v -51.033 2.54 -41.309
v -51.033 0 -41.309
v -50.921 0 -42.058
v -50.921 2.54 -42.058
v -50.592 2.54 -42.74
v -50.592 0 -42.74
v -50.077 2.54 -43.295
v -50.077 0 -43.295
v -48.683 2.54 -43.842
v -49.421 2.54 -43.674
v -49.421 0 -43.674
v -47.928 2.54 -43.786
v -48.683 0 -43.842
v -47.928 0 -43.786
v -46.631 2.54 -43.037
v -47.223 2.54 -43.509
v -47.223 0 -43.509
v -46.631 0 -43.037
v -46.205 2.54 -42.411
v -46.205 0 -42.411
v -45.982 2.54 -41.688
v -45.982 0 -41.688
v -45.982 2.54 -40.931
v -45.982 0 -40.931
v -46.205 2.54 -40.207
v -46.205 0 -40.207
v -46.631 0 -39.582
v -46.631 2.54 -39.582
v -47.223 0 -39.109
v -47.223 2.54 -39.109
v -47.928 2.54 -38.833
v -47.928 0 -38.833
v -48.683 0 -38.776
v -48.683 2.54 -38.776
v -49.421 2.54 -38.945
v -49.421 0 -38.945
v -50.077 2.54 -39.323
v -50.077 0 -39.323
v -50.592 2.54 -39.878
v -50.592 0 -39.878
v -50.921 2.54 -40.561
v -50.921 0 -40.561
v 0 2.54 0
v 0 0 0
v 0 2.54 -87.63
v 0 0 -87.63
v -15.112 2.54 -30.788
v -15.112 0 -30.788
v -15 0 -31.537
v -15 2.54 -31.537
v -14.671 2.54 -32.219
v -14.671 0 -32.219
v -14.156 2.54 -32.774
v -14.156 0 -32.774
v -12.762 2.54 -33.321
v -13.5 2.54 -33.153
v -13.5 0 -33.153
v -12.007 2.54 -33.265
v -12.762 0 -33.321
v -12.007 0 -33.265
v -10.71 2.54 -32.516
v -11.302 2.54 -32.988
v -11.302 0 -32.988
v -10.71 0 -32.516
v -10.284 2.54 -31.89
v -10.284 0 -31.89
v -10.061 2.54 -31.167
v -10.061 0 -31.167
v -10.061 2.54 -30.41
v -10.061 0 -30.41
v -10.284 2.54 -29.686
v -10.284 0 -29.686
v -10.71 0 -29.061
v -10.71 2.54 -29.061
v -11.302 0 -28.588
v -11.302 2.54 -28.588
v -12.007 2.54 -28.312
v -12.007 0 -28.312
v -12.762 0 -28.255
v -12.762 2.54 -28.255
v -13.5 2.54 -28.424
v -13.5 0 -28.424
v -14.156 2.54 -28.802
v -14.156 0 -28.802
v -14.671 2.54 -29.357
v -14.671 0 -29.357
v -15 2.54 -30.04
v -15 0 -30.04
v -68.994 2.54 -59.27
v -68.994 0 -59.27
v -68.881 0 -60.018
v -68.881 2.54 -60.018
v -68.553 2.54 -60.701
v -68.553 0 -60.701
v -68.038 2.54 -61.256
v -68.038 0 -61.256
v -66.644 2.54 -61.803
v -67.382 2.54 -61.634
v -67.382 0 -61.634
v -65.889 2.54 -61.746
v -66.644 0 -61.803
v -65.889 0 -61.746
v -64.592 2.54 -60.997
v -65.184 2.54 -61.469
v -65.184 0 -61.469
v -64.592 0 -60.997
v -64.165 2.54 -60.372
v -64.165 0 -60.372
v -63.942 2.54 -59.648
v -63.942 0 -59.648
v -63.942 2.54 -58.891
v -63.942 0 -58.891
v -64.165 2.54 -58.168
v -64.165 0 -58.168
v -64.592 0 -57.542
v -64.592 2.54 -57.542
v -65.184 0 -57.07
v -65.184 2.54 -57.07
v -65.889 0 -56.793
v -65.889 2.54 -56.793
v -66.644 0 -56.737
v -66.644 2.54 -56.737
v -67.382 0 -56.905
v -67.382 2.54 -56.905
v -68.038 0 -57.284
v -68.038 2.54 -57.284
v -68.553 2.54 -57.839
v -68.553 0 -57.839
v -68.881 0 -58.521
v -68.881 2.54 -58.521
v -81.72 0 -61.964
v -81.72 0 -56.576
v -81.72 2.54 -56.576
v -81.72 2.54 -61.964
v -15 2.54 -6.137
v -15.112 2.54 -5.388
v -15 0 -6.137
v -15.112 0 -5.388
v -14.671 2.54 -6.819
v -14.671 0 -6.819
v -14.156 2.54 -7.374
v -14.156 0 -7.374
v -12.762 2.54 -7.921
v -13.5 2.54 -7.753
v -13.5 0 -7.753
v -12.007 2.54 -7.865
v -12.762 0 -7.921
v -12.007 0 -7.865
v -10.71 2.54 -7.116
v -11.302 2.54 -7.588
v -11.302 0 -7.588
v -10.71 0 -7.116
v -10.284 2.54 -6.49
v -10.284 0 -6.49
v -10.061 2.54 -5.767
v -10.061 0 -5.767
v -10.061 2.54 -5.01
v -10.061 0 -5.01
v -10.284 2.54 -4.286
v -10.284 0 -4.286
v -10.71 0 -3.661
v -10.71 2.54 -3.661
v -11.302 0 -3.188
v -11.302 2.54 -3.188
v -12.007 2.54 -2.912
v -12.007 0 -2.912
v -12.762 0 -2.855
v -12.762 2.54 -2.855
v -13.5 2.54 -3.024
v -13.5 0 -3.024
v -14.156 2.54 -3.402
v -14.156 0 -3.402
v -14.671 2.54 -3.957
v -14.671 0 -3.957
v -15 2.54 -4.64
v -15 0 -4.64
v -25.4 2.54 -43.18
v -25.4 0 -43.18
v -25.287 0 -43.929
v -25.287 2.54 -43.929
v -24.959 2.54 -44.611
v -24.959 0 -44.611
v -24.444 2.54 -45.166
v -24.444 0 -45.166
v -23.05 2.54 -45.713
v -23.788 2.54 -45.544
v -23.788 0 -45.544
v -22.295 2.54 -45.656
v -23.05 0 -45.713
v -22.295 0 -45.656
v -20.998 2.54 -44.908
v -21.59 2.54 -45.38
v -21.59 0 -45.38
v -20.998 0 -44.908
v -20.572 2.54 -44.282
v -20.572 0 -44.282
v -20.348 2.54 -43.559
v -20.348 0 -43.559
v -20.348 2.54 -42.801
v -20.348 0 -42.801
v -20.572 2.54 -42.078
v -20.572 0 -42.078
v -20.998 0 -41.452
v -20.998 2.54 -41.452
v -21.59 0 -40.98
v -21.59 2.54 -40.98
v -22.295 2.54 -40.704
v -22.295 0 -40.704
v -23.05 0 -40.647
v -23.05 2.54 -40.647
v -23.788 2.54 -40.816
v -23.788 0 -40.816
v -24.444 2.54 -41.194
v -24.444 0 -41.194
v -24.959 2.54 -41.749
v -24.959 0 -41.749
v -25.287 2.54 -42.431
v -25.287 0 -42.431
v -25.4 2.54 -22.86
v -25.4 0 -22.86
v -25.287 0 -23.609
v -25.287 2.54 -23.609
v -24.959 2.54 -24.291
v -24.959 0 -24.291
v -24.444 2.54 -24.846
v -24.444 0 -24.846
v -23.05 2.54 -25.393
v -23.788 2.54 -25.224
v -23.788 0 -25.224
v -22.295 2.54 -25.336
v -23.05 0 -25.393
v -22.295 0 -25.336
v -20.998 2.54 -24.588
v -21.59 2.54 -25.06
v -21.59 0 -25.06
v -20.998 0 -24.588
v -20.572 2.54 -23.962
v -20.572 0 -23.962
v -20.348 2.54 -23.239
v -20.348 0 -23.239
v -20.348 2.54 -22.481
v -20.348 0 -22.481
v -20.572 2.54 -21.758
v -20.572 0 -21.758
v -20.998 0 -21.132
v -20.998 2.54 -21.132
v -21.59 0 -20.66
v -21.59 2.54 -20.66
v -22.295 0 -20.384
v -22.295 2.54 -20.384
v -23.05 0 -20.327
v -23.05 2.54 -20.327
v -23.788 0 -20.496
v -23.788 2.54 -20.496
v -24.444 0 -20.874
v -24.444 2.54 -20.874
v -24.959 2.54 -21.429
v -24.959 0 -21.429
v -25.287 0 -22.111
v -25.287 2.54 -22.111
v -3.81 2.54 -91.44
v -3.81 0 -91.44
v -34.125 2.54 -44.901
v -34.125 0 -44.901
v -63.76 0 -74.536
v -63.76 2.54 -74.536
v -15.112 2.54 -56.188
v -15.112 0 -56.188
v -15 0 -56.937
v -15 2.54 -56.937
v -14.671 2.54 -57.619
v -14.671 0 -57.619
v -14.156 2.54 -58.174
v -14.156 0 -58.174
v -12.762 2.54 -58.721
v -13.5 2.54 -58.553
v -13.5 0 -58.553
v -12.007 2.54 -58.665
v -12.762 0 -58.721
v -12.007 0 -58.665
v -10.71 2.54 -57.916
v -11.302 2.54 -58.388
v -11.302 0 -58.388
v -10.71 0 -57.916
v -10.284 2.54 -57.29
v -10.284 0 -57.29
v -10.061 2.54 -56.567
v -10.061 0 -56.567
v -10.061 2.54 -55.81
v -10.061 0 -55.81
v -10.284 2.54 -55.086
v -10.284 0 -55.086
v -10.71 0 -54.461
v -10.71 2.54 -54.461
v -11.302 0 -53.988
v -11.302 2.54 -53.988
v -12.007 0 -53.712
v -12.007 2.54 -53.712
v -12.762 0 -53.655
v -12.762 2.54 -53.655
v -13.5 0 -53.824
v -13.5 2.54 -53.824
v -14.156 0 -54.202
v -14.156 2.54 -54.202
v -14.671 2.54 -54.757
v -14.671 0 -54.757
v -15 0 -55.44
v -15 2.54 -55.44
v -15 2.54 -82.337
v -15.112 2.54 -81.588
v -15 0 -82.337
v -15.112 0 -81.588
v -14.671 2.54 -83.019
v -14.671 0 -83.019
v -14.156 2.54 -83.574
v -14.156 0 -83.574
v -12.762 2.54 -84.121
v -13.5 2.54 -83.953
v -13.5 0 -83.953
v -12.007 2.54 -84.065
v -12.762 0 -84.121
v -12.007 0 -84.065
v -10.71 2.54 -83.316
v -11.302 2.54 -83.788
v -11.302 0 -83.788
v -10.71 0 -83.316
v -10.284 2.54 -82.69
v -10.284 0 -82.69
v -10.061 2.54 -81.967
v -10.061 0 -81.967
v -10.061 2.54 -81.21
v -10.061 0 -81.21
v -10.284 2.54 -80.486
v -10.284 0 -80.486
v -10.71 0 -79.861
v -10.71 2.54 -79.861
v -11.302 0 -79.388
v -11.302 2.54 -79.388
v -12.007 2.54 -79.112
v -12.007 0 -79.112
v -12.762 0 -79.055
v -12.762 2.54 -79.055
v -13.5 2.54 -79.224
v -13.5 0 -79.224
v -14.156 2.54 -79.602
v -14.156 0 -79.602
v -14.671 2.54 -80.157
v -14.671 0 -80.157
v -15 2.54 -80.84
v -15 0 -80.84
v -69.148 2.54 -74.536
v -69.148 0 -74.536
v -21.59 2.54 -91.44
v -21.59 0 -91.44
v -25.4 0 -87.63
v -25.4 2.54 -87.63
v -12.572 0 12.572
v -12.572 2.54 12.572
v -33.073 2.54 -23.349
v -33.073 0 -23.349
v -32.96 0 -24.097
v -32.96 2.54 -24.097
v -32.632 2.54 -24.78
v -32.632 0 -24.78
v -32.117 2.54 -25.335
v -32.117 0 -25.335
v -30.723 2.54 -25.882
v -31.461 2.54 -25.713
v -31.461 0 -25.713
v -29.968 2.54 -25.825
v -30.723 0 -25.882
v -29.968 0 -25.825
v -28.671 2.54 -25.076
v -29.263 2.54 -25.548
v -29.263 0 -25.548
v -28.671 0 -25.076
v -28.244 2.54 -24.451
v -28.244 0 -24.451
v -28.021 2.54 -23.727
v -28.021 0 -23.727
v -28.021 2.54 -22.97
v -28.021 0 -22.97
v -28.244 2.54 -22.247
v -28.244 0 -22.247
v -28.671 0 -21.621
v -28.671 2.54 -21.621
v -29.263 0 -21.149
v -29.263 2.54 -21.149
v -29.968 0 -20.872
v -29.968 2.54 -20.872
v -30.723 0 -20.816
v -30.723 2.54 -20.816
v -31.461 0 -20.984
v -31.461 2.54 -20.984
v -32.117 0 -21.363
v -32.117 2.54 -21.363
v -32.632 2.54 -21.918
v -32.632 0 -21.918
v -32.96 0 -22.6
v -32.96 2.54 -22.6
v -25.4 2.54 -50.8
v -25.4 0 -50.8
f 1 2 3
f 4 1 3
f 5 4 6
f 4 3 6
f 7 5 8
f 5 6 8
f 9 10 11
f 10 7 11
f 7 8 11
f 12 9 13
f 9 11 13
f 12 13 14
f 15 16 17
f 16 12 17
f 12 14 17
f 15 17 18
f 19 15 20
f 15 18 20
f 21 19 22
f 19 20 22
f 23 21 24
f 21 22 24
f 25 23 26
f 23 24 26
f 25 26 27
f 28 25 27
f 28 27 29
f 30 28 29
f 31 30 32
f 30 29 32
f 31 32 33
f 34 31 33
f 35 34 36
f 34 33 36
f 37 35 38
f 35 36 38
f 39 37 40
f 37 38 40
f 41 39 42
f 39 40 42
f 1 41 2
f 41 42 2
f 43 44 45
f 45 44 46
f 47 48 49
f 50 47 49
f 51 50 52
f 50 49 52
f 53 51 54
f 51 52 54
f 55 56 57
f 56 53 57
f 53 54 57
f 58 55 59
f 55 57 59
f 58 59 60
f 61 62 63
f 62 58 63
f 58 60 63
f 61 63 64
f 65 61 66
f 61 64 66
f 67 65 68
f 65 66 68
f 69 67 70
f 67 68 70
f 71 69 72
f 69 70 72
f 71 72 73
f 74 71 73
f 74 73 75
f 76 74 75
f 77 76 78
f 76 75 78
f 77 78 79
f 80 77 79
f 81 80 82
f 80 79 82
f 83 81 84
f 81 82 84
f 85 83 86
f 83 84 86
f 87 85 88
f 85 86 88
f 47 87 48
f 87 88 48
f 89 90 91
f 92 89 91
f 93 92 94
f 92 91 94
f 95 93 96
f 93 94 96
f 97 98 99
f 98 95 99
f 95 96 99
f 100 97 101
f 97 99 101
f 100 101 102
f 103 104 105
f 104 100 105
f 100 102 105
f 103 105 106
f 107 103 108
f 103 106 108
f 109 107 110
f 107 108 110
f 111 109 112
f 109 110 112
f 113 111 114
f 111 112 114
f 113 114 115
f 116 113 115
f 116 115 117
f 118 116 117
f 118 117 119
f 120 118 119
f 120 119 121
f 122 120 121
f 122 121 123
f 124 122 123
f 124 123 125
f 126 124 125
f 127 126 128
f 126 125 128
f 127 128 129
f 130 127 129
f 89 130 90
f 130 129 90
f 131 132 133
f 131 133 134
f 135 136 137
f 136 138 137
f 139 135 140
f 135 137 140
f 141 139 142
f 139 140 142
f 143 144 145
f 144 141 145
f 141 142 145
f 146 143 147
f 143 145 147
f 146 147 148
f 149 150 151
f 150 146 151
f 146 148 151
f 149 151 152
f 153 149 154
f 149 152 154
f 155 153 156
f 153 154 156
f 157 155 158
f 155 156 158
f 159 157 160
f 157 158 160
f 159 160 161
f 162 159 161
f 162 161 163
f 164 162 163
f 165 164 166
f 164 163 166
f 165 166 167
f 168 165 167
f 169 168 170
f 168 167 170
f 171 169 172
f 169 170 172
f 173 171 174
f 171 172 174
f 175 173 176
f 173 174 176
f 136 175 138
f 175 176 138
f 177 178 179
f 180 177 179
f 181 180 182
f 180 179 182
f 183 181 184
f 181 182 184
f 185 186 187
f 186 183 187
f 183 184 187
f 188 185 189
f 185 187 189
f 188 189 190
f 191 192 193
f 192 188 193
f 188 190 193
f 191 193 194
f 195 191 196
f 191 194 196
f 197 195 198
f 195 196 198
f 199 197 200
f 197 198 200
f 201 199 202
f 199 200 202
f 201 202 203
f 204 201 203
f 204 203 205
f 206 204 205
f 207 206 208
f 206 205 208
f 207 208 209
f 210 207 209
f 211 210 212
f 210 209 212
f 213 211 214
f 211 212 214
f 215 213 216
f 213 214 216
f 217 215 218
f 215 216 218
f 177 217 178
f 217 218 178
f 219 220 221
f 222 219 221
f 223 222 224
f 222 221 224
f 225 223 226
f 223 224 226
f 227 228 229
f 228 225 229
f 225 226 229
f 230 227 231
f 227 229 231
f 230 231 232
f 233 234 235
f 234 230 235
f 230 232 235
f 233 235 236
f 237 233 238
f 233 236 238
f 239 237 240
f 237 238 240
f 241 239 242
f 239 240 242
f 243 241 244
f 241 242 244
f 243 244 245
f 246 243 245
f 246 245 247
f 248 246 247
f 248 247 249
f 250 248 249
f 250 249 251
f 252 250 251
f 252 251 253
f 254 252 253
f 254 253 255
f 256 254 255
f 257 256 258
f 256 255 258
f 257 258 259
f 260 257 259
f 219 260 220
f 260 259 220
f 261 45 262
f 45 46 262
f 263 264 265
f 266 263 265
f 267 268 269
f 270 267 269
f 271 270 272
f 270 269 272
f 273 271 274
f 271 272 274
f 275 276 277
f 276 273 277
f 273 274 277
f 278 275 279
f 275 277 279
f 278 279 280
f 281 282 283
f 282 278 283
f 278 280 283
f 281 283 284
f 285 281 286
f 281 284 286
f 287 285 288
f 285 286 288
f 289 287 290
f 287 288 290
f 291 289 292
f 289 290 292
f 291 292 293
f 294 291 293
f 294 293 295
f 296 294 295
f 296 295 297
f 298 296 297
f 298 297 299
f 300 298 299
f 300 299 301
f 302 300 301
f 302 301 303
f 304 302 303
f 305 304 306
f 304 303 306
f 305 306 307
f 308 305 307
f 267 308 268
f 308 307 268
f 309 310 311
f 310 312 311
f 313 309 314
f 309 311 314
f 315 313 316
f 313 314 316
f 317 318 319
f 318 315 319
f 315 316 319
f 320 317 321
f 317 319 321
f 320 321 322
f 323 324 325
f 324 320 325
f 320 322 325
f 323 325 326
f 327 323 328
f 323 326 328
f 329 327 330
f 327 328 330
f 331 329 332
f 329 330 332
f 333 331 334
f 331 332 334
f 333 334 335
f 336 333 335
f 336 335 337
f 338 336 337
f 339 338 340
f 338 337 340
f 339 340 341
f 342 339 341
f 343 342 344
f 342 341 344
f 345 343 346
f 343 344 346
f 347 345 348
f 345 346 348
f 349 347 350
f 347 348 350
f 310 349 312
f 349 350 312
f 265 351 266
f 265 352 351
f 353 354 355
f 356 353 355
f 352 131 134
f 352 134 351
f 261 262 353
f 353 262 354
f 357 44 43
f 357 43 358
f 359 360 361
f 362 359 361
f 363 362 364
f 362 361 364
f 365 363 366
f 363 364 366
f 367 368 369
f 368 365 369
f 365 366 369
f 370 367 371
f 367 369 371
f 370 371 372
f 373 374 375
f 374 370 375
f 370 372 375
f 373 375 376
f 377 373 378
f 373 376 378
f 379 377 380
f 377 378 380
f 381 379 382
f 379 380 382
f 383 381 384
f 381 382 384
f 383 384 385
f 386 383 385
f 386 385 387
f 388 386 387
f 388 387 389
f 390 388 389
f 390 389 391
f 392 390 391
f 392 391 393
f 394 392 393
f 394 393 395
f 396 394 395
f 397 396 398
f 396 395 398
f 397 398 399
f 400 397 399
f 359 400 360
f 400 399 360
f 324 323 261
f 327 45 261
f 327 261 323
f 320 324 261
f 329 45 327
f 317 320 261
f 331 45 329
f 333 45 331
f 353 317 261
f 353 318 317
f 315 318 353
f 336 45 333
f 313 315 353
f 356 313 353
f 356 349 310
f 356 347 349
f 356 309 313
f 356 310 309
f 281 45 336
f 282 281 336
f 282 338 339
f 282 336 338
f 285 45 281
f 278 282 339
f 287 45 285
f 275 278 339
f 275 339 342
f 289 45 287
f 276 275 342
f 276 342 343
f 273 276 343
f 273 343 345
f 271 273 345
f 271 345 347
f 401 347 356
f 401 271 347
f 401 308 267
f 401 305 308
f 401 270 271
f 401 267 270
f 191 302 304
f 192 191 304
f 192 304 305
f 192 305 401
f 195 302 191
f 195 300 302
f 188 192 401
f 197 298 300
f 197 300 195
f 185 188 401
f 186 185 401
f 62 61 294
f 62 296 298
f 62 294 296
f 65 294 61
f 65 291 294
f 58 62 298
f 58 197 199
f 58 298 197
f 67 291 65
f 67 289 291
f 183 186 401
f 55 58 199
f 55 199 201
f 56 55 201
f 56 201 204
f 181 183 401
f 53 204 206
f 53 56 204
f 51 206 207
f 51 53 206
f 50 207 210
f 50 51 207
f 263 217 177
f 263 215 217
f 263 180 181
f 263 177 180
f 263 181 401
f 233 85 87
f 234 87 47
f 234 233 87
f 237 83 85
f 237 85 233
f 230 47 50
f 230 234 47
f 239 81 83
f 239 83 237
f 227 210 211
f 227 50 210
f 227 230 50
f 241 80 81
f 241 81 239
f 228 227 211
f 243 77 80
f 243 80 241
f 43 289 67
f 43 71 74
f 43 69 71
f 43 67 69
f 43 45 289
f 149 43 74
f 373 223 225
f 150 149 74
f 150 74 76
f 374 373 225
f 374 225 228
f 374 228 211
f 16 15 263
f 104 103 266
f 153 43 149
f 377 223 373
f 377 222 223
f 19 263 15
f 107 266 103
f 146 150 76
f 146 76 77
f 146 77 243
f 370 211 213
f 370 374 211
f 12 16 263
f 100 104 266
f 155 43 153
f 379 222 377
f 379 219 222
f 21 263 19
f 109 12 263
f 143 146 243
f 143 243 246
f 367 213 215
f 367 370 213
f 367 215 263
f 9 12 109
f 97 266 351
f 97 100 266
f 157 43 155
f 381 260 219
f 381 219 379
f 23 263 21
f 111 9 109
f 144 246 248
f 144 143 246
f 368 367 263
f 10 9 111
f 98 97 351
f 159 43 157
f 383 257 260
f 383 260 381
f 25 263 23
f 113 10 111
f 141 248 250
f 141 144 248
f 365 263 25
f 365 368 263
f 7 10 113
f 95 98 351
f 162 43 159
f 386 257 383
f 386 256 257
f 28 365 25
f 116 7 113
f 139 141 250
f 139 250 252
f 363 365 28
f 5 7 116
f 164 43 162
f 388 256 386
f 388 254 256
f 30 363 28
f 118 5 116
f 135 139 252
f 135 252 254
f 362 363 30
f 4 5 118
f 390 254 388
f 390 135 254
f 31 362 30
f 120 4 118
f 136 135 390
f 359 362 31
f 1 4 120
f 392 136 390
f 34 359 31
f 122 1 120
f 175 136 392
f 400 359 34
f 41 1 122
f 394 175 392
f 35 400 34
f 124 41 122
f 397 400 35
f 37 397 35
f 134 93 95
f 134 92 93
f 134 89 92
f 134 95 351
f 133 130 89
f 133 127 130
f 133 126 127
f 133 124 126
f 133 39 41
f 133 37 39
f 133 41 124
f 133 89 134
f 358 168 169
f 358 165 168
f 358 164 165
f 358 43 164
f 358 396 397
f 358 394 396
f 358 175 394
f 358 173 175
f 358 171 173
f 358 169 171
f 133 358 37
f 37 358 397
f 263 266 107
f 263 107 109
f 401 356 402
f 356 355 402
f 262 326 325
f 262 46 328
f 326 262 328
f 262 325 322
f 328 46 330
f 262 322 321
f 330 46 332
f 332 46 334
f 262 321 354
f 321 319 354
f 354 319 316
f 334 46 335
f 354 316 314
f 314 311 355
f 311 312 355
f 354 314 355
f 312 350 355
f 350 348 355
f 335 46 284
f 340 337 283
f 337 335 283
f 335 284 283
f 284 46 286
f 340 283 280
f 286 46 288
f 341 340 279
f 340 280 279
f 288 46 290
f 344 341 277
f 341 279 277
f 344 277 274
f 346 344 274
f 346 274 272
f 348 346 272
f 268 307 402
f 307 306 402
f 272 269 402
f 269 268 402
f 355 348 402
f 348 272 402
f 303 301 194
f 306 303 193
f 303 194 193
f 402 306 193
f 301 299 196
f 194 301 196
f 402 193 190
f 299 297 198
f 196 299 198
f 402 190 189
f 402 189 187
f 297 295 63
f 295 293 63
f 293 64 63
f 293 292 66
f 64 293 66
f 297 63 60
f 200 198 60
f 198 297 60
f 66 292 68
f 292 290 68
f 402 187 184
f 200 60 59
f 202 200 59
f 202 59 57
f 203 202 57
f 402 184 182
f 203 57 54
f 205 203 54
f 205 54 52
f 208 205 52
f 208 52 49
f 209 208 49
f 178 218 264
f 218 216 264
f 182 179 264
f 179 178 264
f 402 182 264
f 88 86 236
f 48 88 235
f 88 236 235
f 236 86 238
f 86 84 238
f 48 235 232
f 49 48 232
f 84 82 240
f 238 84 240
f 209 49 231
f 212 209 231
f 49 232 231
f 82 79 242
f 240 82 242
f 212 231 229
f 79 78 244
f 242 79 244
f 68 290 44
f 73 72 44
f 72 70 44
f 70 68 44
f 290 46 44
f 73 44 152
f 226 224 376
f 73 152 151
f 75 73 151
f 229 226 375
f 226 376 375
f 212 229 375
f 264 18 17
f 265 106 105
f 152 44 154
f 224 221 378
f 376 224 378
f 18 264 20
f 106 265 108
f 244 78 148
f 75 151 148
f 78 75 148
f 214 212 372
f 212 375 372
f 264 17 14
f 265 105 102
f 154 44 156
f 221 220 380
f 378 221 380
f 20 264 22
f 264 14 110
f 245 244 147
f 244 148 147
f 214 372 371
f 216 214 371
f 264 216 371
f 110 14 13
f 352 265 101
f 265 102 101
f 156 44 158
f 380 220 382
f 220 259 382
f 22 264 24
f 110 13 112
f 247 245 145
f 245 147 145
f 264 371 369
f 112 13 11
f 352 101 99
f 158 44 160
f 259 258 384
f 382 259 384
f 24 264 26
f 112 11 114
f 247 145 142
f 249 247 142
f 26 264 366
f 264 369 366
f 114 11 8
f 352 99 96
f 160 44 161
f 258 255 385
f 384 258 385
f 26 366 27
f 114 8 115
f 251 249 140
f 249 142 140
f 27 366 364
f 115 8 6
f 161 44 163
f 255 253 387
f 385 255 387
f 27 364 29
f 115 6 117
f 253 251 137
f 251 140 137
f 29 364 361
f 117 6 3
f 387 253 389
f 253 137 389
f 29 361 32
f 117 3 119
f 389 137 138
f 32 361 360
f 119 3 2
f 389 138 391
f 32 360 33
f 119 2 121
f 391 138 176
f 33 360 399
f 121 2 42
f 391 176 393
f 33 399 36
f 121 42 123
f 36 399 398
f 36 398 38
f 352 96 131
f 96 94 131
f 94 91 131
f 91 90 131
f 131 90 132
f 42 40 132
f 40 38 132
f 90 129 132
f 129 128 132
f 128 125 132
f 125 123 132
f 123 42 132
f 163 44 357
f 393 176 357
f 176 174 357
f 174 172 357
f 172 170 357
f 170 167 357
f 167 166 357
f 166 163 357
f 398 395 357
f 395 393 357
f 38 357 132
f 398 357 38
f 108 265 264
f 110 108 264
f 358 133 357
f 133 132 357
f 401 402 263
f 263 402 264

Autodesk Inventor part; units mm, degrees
ref_plane "YZ Plane" through (0, 0, 0) normal (1, 0, 0) x (0, 1, 0)
ref_plane "XZ Plane" through (0, 0, 0) normal (0, 1, 0) x (-1, 0, 0)
ref_plane "XY Plane" through (0, 0, 0) normal (0, 0, 1) x (1, 0, 0)
sketch "Sketch1" plane through (0, 0, 0) normal (0, 1, 0) x (-1, 0, 0)
  line L0 (0, 0) -> (12.5724, 12.5724)
  line L1 (0, 0) -> (17.78, 0) construction
  line L2 (25.4, -50.8) -> (34.125, -44.9013)
  circle A0 centre (66.4539, -59.2697) radius 2.54
  circle A1 centre (48.4934, -41.3092) radius 2.54
  circle A2 centre (30.5329, -23.3487) radius 2.54
  circle A3 centre (12.5724, -5.3882) radius 2.54
  circle A4 centre (12.5724, -30.7882) radius 2.54
  circle A5 centre (12.5724, -56.1882) radius 2.54
  circle A6 centre (12.5724, -81.5882) radius 2.54
  circle A7 centre (22.86, -43.18) radius 2.54
  circle A8 centre (22.86, -22.86) radius 2.54
  line L3 (81.7203, -56.5756) -> (81.7203, -61.9638)
  line L4 (69.148, -74.5361) -> (63.7598, -74.5361)
  line L5 (21.59, -91.44) -> (25.4, -87.63)
  line L6 (0, -87.63) -> (3.81, -91.44)
  line L7 (81.7203, -61.9638) -> (69.148, -74.5361)
  line L8 (81.7203, -56.5756) -> (12.5724, 12.5724)
  line L9 (0, 0) -> (0, -87.63)
  line L10 (3.81, -91.44) -> (21.59, -91.44)
  line L11 (25.4, -87.63) -> (25.4, -50.8)
  line L12 (34.125, -44.9013) -> (63.7598, -74.5361)
  dimension "d3" = 17.78
  dimension "d4" = 45
extrude "Extrusion1" add sketch "Sketch1" along normal blind 2.54
properties part number "1in 60deg bracket for alu extrusion" material "Steel, Alloy"
